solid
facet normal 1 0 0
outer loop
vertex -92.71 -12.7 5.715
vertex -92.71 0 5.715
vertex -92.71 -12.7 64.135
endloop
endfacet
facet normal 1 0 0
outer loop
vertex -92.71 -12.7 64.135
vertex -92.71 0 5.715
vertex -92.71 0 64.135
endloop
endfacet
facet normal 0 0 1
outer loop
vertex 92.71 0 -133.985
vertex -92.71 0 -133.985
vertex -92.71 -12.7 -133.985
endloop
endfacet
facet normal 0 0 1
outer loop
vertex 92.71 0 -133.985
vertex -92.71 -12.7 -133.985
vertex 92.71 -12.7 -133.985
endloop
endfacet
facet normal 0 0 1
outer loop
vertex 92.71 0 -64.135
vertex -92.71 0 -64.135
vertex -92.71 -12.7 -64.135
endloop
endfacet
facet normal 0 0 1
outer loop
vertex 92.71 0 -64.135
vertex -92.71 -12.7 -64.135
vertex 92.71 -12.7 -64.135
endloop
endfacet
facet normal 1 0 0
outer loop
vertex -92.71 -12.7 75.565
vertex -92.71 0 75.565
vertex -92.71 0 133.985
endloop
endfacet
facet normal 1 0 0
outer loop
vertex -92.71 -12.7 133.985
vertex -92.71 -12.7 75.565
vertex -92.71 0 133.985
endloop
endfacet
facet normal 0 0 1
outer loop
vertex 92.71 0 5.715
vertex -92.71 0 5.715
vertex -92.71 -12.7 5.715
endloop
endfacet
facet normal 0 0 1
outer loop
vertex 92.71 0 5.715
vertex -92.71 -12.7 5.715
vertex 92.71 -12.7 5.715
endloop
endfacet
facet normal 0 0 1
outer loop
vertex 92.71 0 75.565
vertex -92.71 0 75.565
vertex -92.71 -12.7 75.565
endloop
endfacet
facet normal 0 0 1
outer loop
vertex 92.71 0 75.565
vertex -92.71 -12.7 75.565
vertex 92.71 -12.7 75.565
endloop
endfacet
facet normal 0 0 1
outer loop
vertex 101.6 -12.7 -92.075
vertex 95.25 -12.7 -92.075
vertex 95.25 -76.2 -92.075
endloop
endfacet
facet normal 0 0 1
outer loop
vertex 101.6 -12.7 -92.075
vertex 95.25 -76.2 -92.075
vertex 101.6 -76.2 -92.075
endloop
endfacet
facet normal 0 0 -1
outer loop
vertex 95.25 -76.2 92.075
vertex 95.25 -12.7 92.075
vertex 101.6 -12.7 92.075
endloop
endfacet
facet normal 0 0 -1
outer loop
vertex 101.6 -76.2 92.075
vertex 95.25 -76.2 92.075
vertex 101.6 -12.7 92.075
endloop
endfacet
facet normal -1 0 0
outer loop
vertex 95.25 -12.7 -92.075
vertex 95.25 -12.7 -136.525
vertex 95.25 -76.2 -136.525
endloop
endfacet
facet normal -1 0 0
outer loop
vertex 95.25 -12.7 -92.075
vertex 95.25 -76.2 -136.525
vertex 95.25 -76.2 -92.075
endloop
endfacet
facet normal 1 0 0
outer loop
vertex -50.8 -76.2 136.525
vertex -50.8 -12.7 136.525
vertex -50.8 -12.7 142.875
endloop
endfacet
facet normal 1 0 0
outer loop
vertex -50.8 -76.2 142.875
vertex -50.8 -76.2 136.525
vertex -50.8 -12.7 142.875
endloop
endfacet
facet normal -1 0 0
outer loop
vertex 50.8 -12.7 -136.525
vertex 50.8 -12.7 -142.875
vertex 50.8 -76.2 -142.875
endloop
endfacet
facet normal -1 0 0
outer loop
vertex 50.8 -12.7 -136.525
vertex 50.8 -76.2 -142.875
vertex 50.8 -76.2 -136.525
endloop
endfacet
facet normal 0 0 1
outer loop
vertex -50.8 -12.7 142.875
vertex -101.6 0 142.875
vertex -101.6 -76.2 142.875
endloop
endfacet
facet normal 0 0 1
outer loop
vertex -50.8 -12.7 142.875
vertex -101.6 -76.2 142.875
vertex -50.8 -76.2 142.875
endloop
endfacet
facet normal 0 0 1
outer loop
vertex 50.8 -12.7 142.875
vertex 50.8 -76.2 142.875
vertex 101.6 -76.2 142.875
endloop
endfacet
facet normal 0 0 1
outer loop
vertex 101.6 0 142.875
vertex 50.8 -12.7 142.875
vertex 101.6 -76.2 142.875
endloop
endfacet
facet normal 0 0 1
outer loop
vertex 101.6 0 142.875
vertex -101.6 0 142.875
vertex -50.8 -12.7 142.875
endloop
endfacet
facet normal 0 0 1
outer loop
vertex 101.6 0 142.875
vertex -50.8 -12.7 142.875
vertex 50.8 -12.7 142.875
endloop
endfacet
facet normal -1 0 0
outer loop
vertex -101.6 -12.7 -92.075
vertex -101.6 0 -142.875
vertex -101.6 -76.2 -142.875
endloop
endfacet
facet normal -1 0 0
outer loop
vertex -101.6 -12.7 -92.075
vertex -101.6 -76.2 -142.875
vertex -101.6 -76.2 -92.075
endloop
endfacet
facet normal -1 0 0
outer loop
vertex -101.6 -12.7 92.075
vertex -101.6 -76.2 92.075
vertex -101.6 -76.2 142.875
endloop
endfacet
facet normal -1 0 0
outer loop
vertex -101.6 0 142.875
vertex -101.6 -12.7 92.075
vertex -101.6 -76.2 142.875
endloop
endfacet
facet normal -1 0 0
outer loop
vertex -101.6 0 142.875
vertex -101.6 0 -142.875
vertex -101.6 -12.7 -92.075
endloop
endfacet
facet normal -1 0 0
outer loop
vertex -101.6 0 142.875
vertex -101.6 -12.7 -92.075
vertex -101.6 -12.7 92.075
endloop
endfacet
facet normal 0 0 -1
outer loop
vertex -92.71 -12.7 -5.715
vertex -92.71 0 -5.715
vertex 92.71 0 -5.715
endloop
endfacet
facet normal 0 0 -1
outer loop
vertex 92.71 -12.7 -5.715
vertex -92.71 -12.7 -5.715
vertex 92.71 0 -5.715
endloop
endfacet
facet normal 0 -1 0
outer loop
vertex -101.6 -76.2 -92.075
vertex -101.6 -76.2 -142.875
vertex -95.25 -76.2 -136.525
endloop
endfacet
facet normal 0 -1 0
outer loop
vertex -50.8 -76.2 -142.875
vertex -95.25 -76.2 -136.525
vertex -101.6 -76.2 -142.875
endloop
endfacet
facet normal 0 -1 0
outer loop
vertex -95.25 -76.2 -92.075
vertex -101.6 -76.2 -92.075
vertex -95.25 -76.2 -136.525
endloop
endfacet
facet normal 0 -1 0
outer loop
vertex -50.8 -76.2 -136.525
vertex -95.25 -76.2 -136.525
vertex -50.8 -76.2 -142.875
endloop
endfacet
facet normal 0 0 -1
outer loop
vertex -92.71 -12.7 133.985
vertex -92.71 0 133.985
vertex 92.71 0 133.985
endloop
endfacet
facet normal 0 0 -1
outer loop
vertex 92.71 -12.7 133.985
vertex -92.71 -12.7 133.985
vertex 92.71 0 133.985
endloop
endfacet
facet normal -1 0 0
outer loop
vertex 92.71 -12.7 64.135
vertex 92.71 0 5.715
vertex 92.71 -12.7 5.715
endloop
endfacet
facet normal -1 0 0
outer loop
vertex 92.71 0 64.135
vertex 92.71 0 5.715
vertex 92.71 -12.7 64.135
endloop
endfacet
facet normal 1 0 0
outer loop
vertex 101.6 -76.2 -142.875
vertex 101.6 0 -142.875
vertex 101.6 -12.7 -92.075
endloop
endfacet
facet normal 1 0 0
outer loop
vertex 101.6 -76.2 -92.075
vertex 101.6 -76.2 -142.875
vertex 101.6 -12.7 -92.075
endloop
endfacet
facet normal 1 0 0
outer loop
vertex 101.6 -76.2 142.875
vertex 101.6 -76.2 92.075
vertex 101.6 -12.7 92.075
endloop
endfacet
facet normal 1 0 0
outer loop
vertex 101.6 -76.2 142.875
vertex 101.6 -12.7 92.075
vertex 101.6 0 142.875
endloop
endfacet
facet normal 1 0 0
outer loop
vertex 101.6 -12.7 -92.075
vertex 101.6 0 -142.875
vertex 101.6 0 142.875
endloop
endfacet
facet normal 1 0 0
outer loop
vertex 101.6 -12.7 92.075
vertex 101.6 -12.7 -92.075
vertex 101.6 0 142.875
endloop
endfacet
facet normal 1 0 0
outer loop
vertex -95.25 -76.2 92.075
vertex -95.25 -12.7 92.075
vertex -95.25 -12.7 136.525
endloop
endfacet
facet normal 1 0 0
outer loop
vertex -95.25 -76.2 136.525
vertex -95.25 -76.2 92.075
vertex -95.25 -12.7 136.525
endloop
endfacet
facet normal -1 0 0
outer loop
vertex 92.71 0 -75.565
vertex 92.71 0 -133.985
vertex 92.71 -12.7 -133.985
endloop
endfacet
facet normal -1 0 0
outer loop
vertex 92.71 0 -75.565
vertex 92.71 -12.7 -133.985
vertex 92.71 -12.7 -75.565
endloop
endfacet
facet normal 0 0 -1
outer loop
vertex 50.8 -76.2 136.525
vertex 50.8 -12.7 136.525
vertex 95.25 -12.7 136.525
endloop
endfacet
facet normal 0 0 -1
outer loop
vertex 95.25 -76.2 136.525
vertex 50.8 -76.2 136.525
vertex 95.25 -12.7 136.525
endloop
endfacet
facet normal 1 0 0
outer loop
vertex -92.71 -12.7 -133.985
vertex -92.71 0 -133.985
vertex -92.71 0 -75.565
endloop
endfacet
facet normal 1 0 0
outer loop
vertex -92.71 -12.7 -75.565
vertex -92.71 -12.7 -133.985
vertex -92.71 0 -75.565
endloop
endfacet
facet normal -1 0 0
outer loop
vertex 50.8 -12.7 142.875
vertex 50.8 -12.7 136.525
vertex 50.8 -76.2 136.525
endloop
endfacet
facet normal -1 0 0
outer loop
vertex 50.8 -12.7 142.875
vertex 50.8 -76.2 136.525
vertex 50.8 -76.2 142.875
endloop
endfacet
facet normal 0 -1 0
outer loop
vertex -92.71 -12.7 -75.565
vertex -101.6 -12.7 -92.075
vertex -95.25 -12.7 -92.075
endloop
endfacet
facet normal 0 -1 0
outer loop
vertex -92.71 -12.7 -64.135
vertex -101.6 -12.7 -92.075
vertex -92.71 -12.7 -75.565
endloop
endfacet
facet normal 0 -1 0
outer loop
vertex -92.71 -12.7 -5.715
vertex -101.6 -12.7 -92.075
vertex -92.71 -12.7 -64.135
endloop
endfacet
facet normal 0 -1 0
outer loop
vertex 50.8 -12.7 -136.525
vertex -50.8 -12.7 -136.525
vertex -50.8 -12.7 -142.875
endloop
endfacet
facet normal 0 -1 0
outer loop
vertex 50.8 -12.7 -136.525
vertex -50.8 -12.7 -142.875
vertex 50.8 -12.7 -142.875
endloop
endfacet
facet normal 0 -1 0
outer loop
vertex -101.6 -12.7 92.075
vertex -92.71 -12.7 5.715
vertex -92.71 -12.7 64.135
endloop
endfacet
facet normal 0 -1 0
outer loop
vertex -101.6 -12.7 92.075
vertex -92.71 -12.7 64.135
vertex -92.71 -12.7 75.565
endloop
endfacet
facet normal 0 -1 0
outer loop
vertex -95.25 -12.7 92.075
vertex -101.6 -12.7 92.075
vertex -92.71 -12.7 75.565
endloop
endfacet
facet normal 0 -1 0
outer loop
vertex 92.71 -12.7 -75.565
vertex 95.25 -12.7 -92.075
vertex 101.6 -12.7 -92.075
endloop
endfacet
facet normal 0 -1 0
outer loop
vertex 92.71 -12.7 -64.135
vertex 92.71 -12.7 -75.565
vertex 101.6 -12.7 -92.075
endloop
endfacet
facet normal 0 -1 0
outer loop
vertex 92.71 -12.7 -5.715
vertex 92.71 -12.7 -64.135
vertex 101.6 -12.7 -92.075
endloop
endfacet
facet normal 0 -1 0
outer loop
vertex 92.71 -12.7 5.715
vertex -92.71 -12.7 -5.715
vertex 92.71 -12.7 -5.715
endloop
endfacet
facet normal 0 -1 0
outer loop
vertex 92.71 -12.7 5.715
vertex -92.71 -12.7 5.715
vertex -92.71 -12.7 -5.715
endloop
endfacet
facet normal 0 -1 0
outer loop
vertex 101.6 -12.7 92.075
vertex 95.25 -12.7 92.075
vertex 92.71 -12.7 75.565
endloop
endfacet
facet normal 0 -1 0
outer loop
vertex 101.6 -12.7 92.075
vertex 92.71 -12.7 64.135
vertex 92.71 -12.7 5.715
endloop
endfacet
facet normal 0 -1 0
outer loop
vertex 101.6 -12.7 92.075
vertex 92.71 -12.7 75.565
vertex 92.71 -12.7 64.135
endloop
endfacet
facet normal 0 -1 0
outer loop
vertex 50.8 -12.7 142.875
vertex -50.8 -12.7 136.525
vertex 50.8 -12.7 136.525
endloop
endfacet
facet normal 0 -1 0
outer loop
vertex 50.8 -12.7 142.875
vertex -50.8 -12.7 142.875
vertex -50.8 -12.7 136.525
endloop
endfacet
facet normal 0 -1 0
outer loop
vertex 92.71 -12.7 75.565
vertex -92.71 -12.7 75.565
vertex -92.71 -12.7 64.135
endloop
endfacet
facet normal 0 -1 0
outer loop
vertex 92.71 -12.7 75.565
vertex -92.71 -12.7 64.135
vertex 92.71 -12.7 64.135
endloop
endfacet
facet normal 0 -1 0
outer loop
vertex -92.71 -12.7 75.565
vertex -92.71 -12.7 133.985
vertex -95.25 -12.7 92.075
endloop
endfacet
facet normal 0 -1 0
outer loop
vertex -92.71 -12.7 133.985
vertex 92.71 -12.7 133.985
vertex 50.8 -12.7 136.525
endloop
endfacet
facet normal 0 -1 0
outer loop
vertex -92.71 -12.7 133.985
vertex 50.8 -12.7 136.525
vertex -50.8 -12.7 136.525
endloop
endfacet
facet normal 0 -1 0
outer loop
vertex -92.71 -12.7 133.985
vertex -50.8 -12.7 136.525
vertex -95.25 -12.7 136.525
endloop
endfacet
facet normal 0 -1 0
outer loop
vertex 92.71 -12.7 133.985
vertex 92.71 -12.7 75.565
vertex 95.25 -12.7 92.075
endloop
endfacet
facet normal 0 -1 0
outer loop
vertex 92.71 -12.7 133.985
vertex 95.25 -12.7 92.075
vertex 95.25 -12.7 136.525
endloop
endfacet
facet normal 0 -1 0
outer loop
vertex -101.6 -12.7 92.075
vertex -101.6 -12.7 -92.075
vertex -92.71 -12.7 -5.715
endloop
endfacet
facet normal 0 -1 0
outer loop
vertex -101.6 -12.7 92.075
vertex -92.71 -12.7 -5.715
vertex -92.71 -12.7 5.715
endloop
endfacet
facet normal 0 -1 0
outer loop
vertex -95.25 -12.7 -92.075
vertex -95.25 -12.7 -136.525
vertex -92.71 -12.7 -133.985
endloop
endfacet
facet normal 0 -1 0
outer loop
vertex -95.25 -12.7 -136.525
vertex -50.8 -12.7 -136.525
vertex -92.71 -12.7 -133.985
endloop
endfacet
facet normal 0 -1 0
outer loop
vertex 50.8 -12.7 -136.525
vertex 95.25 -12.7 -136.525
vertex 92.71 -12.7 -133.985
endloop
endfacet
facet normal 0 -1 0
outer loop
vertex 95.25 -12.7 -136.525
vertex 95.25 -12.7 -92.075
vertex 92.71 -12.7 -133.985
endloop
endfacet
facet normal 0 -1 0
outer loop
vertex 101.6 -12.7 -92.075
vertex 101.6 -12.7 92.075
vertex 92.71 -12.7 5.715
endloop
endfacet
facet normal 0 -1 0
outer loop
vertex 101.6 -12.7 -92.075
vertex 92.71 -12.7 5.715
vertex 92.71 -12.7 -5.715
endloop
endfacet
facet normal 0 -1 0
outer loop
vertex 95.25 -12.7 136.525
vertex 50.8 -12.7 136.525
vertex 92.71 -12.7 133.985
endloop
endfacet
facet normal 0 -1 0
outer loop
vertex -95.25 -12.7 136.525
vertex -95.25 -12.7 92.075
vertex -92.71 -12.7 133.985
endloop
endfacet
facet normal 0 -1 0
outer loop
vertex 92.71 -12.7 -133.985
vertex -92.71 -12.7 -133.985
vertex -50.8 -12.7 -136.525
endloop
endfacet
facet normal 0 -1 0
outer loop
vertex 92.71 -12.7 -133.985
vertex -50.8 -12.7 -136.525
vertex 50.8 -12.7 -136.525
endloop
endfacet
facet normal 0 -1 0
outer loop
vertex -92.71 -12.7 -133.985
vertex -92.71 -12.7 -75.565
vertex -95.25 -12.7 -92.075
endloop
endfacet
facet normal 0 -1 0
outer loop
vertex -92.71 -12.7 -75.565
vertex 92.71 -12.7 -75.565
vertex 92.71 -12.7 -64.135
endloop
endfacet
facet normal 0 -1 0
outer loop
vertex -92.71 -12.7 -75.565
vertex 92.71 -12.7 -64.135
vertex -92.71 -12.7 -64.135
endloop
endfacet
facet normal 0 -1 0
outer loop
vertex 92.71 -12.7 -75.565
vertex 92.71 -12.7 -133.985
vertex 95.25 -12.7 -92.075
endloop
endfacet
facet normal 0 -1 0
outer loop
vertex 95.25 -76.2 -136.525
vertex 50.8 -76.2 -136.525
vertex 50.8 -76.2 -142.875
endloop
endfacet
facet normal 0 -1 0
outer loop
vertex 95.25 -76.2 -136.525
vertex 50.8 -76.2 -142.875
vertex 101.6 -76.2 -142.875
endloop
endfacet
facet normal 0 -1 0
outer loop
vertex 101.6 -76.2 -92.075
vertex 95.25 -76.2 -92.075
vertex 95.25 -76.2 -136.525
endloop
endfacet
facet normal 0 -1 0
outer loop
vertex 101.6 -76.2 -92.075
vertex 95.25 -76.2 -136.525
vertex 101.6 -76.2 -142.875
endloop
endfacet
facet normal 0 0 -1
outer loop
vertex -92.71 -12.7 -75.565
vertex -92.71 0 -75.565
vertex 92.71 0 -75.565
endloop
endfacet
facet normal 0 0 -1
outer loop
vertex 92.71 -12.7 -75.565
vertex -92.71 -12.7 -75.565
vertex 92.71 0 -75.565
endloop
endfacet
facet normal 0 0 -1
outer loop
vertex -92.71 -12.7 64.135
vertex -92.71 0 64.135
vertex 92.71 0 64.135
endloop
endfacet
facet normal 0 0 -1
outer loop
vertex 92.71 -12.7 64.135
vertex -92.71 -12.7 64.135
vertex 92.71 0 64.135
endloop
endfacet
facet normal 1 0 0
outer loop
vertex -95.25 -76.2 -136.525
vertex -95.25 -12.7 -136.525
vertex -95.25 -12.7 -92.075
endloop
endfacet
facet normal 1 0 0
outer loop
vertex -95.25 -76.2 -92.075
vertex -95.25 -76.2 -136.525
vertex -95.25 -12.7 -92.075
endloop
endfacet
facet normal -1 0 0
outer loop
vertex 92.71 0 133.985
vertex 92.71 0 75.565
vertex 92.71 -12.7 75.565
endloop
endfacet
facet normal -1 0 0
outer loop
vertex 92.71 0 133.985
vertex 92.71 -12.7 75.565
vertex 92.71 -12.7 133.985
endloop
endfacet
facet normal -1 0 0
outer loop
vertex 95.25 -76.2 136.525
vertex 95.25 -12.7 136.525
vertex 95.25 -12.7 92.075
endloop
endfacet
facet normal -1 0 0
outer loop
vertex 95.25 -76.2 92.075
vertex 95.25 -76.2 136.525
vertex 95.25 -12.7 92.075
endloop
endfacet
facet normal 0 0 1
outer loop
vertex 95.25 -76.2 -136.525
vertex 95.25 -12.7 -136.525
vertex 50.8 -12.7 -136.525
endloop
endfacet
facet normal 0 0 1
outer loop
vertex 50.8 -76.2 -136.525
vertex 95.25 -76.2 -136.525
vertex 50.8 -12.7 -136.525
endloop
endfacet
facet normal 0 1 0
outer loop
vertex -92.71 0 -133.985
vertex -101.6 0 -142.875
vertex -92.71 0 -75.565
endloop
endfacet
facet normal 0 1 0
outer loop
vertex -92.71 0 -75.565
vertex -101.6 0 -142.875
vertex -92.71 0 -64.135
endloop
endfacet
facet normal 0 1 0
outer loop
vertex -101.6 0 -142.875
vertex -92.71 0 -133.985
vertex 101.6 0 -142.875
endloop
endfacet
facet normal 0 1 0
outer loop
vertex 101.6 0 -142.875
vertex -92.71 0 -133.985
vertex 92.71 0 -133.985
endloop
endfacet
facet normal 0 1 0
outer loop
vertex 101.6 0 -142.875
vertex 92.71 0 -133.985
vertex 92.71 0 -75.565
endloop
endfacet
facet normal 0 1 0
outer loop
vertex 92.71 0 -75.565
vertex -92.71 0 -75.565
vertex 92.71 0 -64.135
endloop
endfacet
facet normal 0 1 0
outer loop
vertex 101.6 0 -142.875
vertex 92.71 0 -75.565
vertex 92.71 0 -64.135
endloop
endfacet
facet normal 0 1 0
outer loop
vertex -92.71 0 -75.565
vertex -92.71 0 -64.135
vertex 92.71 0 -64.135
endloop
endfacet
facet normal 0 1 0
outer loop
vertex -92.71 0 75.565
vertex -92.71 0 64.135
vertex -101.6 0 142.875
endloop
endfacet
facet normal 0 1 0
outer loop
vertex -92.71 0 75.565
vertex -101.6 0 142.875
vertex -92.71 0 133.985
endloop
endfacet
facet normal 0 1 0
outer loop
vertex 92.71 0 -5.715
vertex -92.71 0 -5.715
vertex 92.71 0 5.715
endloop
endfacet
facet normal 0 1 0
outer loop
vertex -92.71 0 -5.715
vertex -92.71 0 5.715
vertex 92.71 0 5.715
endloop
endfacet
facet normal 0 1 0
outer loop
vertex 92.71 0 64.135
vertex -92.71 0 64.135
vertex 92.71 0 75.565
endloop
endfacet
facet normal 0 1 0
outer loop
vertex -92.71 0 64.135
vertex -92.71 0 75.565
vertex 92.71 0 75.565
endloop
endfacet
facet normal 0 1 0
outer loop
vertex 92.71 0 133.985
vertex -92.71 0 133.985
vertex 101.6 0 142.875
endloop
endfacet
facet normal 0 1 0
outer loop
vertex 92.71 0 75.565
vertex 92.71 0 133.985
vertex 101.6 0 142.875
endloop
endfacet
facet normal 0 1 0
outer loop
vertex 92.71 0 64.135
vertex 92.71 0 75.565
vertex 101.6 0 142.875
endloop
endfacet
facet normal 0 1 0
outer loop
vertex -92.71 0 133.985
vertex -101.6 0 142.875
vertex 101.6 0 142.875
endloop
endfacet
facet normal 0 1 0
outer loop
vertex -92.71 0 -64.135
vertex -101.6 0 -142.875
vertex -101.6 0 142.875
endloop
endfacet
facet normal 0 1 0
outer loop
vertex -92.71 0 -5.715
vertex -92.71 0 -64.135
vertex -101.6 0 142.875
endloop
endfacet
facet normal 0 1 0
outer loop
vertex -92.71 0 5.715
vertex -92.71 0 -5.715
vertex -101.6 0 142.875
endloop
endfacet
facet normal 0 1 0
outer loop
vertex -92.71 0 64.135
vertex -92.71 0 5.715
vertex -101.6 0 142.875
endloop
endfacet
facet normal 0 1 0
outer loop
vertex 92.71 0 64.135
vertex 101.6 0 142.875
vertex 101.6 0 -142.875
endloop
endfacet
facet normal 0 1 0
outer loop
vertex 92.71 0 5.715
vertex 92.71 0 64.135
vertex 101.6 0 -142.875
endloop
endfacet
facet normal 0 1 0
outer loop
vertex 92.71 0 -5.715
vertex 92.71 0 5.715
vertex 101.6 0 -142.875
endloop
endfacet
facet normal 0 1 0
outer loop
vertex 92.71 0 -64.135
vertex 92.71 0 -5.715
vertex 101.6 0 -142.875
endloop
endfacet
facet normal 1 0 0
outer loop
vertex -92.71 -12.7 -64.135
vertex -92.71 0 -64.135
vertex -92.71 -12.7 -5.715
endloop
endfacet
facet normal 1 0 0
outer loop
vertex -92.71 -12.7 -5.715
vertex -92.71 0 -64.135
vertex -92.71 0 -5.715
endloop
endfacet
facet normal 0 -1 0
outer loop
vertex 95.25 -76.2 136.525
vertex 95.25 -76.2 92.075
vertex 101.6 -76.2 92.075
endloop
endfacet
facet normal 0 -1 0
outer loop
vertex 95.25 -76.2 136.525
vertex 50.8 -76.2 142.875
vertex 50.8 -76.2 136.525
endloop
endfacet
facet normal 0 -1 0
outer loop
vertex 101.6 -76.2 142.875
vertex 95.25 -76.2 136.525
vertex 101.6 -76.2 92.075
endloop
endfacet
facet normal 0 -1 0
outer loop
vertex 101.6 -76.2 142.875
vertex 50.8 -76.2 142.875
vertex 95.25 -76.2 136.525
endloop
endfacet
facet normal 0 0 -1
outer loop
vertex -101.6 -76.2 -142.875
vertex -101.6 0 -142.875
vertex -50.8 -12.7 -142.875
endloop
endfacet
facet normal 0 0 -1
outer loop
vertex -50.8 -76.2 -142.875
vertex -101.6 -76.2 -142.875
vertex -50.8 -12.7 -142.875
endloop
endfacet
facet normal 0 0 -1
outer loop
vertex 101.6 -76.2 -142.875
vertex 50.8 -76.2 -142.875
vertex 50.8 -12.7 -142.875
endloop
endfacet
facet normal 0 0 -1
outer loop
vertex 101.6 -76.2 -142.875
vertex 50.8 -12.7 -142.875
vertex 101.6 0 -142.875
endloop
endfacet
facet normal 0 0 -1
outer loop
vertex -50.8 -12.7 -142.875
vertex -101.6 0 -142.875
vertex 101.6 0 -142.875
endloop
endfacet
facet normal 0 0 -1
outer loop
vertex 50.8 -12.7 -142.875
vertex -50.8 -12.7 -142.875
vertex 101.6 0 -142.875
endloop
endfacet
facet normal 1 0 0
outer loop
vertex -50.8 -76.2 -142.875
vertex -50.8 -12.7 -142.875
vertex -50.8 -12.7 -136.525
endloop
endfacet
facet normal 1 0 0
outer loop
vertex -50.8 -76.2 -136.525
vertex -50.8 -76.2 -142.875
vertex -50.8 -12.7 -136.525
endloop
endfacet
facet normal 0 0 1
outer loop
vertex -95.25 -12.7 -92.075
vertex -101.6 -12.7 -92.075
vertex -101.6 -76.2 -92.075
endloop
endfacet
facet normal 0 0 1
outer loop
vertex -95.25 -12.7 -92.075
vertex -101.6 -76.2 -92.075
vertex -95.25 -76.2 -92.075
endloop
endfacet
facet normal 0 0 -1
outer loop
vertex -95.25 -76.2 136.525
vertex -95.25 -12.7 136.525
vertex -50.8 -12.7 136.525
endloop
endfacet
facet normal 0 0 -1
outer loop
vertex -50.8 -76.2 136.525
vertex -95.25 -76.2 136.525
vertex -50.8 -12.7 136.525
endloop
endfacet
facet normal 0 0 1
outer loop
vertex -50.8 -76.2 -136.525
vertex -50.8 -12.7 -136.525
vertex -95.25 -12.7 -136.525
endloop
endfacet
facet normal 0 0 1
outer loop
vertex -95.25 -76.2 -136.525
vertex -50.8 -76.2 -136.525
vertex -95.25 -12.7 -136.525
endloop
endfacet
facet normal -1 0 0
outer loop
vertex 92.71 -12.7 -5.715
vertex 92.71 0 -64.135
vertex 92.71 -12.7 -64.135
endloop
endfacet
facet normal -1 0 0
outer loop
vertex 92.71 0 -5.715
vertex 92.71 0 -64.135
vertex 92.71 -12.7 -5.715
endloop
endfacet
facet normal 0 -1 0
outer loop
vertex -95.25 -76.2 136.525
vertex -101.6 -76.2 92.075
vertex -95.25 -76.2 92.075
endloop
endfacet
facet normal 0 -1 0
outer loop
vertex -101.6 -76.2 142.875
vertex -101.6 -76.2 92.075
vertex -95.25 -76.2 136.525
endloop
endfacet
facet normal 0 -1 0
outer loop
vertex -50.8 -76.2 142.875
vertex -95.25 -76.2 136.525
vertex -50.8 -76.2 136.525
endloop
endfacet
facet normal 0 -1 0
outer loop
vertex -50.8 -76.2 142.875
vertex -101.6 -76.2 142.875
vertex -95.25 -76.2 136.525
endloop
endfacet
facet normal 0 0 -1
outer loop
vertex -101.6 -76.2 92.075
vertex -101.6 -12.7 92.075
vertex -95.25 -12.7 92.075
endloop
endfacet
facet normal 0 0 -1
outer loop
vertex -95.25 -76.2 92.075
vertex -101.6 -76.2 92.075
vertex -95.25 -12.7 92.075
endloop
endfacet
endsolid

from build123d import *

# Parameters (mm, degrees)
F0_W     = 203.2
F0_H     = 285.75
F0_W_2   = 190.5
F0_H_2   = 63.5
F0_W_3   = 185.42
F0_H_3   = 58.42
F1_DEPTH = 12.7
F3_W     = 6.35
F3_H     = 6.35
F3_W_2   = 44.45
F3_H_2   = 44.45
F4_DEPTH = 63.5


# Not quite as in the source:
# - the program builds the solid bodies; features that only make, move or delete a surface that nothing else refers to are left out


with BuildPart() as f1:
    # F0 (on Front) → F1 (new body)
    with BuildSketch(Plane.XZ):
        Rectangle(F0_W, F0_H)
        with Locations((0, -104.775)):
            Rectangle(F0_W_2, F0_H_2, mode=Mode.SUBTRACT)
        with Locations((0, -34.925)):
            Rectangle(F0_W_2, F0_H_2, mode=Mode.SUBTRACT)
        with Locations((0, 34.925)):
            Rectangle(F0_W_2, F0_H_2, mode=Mode.SUBTRACT)
        with Locations((0, 104.775)):
            Rectangle(F0_W_2, F0_H_2, mode=Mode.SUBTRACT)
        with Locations((0, 104.775)):
            Rectangle(F0_W_2, F0_H_2)
        with Locations((0, 104.775)):
            Rectangle(F0_W_3, F0_H_3, mode=Mode.SUBTRACT)
        with Locations((0, 34.925)):
            Rectangle(F0_W_2, F0_H_2)
        with Locations((0, 34.925)):
            Rectangle(F0_W_3, F0_H_3, mode=Mode.SUBTRACT)
        with Locations((0, -34.925)):
            Rectangle(F0_W_2, F0_H_2)
        with Locations((0, -34.925)):
            Rectangle(F0_W_3, F0_H_3, mode=Mode.SUBTRACT)
        with Locations((0, -104.775)):
            Rectangle(F0_W_2, F0_H_2)
        with Locations((0, -104.775)):
            Rectangle(F0_W_3, F0_H_3, mode=Mode.SUBTRACT)
    extrude(amount=F1_DEPTH)

    # F3 (on face) → F4 (join)
    with BuildSketch(Plane.XZ.offset(12.7)):
        with Locations((98.425, -139.7)):
            Rectangle(F3_W, F3_H)
        with Locations((73.025, -139.7)):
            Rectangle(F3_W_2, F3_H)
        with Locations((98.425, -114.3)):
            Rectangle(F3_W, F3_H_2)
        with Locations((98.425, 114.3)):
            Rectangle(F3_W, F3_H_2)
        with Locations((98.425, 139.7)):
            Rectangle(F3_W, F3_H)
        with Locations((73.025, 139.7)):
            Rectangle(F3_W_2, F3_H)
        with Locations((-98.425, -139.7)):
            Rectangle(F3_W, F3_H)
        with Locations((-73.025, -139.7)):
            Rectangle(F3_W_2, F3_H)
        with Locations((-98.425, -114.3)):
            Rectangle(F3_W, F3_H_2)
        with Locations((-98.425, 114.3)):
            Rectangle(F3_W, F3_H_2)
        with Locations((-98.425, 139.7)):
            Rectangle(F3_W, F3_H)
        with Locations((-73.025, 139.7)):
            Rectangle(F3_W_2, F3_H)
    extrude(amount=F4_DEPTH)


solid = f1.part
